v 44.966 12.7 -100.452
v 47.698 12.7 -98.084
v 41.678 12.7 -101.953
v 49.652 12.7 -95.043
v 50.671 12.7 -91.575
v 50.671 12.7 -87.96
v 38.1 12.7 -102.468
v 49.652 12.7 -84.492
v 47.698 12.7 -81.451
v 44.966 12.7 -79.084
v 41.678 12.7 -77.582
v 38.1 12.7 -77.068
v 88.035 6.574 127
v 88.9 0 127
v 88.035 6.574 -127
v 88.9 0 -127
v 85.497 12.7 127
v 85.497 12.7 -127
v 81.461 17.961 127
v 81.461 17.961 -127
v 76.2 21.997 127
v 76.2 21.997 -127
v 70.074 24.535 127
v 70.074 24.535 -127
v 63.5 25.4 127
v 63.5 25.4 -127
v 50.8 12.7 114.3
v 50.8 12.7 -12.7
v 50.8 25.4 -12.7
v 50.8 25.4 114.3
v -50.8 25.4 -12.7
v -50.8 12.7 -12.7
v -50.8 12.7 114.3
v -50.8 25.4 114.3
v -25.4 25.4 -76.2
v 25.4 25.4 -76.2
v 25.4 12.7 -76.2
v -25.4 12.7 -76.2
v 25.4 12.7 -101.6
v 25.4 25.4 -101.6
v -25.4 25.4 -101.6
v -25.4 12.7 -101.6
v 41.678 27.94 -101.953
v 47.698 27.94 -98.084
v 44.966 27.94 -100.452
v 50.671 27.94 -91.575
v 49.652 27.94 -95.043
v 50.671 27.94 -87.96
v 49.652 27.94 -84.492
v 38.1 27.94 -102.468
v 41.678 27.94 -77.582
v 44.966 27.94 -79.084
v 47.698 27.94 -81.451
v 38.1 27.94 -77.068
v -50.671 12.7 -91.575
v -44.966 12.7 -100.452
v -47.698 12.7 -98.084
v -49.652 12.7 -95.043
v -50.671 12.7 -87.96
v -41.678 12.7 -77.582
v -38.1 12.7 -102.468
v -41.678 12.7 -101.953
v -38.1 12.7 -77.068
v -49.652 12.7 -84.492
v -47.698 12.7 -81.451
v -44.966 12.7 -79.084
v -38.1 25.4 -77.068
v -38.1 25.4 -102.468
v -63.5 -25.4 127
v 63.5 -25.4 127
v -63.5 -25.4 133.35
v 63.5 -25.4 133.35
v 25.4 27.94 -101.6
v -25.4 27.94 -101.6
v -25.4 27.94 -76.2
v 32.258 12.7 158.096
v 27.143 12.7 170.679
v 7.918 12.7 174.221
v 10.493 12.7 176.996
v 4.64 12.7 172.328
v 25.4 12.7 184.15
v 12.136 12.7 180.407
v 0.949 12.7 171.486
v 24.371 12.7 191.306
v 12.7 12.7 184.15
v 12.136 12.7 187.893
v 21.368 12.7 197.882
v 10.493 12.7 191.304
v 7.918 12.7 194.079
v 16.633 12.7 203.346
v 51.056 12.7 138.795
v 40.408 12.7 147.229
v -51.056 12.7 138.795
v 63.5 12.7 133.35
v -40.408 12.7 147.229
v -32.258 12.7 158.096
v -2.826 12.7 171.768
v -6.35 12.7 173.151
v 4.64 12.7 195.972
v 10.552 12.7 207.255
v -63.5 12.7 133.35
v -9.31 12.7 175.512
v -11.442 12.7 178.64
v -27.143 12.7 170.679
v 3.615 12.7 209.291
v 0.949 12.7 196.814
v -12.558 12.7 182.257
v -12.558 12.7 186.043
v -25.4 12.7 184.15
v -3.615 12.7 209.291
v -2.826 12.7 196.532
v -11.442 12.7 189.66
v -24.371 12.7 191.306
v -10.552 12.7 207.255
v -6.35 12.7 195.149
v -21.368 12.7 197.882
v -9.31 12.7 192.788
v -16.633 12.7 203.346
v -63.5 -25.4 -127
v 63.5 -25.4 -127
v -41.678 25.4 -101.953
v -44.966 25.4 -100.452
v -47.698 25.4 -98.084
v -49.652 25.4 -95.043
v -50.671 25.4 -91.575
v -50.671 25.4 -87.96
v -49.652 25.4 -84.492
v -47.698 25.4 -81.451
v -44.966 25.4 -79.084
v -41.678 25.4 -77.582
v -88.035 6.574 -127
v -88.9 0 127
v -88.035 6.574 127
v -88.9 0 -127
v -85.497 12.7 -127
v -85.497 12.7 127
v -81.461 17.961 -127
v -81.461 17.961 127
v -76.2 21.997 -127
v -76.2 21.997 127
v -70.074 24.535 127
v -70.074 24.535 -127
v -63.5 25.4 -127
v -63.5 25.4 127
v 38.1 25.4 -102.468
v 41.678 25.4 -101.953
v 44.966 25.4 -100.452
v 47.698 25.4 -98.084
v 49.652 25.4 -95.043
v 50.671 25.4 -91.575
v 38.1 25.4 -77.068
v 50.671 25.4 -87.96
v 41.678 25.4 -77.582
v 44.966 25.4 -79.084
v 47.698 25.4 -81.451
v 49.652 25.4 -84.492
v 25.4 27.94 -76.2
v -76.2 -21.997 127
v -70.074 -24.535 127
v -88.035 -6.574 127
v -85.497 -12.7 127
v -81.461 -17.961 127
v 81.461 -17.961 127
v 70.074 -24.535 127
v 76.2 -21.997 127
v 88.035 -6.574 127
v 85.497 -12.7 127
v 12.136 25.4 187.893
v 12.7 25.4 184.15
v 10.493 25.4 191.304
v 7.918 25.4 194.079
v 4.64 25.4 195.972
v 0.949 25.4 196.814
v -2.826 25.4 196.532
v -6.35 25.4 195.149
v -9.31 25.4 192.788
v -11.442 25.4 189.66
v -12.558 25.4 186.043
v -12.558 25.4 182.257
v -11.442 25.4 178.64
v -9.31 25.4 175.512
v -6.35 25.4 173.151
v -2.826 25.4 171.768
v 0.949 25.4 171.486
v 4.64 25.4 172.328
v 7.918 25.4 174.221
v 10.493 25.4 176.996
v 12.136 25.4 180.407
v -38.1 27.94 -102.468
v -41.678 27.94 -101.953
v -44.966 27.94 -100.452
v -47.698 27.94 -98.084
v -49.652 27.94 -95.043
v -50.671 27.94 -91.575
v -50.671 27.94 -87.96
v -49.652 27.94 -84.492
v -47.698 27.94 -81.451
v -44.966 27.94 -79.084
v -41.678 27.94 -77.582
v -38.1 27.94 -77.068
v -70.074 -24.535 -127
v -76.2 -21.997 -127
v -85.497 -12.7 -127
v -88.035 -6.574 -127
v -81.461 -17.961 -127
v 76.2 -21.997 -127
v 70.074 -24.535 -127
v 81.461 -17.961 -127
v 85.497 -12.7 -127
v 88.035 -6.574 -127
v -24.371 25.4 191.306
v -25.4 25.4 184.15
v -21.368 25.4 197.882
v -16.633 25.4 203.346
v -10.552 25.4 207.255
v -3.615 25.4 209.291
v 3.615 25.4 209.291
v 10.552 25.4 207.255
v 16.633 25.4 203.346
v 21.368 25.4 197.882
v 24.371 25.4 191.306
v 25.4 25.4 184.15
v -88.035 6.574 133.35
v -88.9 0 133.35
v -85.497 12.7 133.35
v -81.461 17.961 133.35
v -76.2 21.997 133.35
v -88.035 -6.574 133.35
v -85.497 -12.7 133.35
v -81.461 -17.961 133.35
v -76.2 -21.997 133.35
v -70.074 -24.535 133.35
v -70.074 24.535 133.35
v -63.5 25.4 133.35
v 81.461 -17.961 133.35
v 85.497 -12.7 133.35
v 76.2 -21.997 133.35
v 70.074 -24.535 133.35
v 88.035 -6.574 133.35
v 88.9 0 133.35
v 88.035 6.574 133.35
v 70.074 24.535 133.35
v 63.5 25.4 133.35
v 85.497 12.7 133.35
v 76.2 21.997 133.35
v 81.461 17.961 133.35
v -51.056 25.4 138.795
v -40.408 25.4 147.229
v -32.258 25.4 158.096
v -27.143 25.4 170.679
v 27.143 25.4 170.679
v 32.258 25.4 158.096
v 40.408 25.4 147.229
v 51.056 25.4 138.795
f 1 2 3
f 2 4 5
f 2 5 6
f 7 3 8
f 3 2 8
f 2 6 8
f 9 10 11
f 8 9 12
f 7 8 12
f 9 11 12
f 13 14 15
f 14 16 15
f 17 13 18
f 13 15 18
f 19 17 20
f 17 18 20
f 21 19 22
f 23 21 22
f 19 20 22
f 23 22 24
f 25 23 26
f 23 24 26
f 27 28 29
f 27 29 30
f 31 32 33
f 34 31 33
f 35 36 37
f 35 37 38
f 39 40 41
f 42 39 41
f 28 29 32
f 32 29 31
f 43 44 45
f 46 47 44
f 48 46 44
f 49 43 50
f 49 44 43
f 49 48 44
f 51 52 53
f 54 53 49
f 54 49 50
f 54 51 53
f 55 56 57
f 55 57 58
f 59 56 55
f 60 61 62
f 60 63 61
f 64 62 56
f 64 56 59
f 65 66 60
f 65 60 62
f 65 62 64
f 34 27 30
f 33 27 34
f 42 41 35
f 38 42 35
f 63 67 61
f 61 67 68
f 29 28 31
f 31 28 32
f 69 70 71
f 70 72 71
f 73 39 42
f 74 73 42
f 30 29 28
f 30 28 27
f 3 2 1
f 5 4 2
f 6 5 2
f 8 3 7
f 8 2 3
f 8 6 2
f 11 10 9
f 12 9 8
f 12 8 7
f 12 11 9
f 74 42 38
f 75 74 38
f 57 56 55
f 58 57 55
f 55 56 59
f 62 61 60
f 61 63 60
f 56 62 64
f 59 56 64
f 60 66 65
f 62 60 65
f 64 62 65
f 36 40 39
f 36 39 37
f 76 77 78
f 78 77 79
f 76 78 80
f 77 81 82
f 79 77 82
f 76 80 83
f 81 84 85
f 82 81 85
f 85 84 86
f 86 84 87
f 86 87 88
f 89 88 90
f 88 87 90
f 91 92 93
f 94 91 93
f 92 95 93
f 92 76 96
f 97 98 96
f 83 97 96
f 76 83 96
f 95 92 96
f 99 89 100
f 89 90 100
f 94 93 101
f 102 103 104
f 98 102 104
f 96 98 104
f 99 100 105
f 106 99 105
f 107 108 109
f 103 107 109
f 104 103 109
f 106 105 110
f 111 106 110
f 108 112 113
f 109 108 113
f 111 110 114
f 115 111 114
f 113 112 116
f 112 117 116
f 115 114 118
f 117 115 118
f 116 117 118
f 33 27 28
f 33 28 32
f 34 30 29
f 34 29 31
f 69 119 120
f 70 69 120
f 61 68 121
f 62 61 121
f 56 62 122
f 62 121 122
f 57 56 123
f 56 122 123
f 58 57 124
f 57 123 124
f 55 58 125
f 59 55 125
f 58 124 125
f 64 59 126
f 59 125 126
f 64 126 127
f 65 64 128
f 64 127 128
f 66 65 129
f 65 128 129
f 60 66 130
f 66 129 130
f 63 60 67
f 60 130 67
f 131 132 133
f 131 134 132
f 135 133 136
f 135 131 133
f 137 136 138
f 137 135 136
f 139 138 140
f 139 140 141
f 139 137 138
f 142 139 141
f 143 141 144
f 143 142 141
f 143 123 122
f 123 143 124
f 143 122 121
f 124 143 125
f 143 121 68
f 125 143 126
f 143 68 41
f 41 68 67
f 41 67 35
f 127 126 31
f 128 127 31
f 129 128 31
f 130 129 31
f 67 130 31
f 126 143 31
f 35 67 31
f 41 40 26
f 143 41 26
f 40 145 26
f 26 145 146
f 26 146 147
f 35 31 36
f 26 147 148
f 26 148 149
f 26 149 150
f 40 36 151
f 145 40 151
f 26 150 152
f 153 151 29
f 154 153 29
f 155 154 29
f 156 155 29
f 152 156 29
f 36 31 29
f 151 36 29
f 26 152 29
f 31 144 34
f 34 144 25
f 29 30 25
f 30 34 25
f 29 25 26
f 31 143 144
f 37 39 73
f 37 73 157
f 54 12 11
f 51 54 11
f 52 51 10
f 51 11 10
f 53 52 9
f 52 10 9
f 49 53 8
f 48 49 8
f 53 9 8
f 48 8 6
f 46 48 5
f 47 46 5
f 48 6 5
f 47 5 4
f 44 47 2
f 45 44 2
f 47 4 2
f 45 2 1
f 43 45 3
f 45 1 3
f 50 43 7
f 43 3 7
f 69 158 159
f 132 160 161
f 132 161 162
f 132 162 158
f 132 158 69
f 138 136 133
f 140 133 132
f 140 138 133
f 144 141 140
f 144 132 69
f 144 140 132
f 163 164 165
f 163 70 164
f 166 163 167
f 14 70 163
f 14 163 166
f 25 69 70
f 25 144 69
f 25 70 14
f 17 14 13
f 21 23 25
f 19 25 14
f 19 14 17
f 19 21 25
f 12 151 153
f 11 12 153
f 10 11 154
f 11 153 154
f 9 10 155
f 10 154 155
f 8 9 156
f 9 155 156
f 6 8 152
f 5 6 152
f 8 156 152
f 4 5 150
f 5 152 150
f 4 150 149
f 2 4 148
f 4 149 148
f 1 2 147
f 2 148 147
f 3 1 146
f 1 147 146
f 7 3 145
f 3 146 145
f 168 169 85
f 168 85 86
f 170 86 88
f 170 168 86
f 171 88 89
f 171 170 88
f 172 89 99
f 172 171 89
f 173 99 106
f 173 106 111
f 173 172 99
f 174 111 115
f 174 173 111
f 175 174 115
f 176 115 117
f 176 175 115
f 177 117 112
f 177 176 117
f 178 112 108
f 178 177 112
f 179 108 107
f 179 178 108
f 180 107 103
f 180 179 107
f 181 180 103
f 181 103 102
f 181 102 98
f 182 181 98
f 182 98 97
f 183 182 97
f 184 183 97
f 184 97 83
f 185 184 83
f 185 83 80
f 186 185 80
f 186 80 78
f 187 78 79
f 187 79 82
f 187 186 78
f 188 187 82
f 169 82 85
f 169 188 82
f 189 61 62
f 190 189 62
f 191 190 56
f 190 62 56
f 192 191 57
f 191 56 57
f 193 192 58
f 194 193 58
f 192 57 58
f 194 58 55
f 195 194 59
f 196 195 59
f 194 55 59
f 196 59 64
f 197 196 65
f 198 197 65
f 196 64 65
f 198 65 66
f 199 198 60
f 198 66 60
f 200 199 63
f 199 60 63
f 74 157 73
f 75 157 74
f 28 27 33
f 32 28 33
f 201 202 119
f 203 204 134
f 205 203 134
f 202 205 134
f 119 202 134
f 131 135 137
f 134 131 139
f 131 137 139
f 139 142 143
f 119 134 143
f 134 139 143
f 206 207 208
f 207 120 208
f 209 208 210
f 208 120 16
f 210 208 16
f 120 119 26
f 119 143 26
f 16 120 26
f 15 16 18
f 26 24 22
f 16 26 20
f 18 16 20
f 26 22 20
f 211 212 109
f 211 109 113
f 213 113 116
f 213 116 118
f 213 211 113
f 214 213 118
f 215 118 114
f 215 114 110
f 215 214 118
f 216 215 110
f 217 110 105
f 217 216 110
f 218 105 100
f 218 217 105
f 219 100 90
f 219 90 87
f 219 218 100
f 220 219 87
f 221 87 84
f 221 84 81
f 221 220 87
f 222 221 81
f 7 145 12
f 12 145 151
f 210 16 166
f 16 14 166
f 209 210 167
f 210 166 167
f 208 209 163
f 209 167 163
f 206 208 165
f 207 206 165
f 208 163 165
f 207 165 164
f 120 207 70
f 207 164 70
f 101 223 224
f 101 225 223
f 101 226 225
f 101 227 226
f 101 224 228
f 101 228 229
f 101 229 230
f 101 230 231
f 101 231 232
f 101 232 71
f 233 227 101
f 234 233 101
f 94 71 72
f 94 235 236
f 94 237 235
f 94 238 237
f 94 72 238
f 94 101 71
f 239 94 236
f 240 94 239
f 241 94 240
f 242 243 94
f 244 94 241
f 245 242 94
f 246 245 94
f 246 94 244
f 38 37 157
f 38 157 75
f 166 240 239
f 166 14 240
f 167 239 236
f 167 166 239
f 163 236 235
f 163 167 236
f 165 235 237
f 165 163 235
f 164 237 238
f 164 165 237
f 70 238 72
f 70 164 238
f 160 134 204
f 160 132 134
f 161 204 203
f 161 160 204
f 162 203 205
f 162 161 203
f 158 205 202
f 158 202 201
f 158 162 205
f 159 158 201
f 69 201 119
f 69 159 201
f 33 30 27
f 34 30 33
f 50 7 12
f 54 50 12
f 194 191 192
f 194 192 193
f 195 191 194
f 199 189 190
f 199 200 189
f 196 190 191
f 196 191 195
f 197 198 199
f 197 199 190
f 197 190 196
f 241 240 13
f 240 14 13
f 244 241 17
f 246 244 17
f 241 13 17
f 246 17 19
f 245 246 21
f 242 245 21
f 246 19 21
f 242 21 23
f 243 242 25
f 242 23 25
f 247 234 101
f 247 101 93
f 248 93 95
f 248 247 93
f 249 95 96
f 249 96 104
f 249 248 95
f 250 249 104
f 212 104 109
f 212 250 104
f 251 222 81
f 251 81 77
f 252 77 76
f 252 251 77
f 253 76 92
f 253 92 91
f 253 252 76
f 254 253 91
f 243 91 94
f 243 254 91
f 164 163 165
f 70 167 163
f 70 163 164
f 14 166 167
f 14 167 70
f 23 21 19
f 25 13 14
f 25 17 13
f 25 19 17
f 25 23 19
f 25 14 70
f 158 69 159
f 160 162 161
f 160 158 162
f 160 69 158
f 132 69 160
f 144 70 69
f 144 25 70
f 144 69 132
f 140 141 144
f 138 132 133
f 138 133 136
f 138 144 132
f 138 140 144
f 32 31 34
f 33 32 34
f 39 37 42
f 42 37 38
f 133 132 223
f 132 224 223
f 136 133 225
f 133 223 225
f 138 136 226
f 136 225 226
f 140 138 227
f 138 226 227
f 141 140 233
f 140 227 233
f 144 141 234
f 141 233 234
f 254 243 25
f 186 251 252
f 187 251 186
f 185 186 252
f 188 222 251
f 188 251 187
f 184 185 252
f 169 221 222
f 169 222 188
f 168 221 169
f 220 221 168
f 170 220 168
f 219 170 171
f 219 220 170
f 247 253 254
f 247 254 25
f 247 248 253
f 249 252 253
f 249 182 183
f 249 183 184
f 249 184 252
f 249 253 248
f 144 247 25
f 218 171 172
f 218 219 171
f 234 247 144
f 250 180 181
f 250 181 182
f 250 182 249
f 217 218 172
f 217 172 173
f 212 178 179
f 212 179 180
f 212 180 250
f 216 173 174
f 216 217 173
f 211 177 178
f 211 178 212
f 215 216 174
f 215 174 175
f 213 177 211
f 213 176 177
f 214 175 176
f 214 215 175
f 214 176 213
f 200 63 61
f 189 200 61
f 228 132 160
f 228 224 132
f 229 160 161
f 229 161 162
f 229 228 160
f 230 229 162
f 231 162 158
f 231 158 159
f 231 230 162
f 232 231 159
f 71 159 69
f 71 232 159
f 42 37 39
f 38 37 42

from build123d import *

# Parameters (mm, degrees)
F0_W      = 177.8
F0_H      = 50.8
F1_DEPTH  = 127
F2_R      = 25.39999
F3_W      = 101.6
F3_H      = 127
F3_W_2    = 50.8
F3_H_2    = 25.4
F4_DEPTH  = 12.7
F5_DEPTH  = 15.24
F6_DEPTH  = 15.24
F7_DEPTH  = 15.24
F8_DEPTH  = 12.7
F10_DEPTH = 50.8
F11_DEPTH = 12.7
F12_R     = 25.39999


# Not quite as in the source:
# - a fillet or chamfer is up to 0.001 mm smaller than in the source, because OpenCascade refuses the exact size
# - ends of sketch curves that miss each other by under 0.0002 mm in the source are joined


with BuildPart() as f1:
    # F0 (on Top) → F1 (new body, symmetric)
    with BuildSketch(Plane.XY):
        Rectangle(F0_W, F0_H)
    extrude(amount=F1_DEPTH, both=True)

    # F2 (radius 25.4 in the source; OpenCascade refuses exactly that, so slightly less here)
    f2_edges = [f1.edges().sort_by_distance(p)[0] for p in [
        (-88.9, -25.4, 0),
        (-88.9, 25.4, 0),
        (88.9, -25.4, 0),
        (88.9, 25.4, 0),
    ]]
    fillet(f2_edges, radius=F2_R)

    # F3 (on face) → F4 (cut)
    with BuildSketch(Plane(origin=(0, 25.4, 0), x_dir=(-1, 0, 0), z_dir=(0, 1, 0))):
        with Locations((0, 50.8)):
            Rectangle(F3_W, F3_H)
        with Locations((0, -88.9)):
            Rectangle(F3_W_2, F3_H_2)
        with BuildLine():
            Line((-38.1, -102.4676784873), (-38.1, -77.0676784873))
            ThreePointArc((-38.1, -77.0676784873), (-50.8, -89.7676784873), (-38.1, -102.4676784873))
        make_face()
        with BuildLine():
            ThreePointArc((38.1, -102.4676784873), (50.8, -89.7676784873), (38.1, -77.0676784873))
            Line((38.1, -77.0676784873), (38.1, -102.4676784873))
        make_face()
    extrude(amount=-F4_DEPTH, mode=Mode.SUBTRACT)


with BuildPart() as f5:
    # F5 (new): a face of the model
    f5_faces = [f1.part.faces().sort_by_distance(p)[0] for p in [
        (43.490047406, 12.7, -89.7676784873),
    ]]
    extrude(f5_faces, amount=F5_DEPTH)


with BuildPart() as f6:
    # F6 (new): a face of the model
    f6_faces = [f1.part.faces().sort_by_distance(p)[0] for p in [
        (0, 12.7, -88.9),
    ]]
    extrude(f6_faces, amount=F6_DEPTH)


with BuildPart() as f7:
    # F7 (new): a face of the model
    f7_faces = [f1.part.faces().sort_by_distance(p)[0] for p in [
        (-43.490047406, 12.7, -89.7676784873),
    ]]
    extrude(f7_faces, amount=F7_DEPTH)


with BuildPart() as f8:
    # F8 (new): a face of the model
    f8_faces = [f1.part.faces().sort_by_distance(p)[0] for p in [
        (0, 12.7, 50.8),
    ]]
    extrude(f8_faces, amount=F8_DEPTH)


with BuildPart() as f10:
    # F9 (on face) → F10 (new body)
    with BuildSketch(Plane(origin=(0, 25.4, 0), x_dir=(-1, 0, 0), z_dir=(0, 1, 0))):
        Polygon((-88.9, 127), (-63.5000066667, 127), (63.5, 127), (88.9, 127), (88.9, 133.35), (63.5, 133.35), (25.4, 133.35), (-25.4, 133.35), (-63.5, 133.35), (-88.9, 133.35), align=None)
    extrude(amount=-F10_DEPTH)

    # F9 (on face) → F11 (join)
    with BuildSketch(Plane(origin=(0, 25.4, 0), x_dir=(-1, 0, 0), z_dir=(0, 1, 0))):
        with BuildLine():
            Line((-25.4, 184.15), (-25.4, 133.35))
            Line((-25.4, 133.35), (25.4, 133.35))
            Line((25.4, 133.35), (25.4, 184.15))
            Line((25.4, 184.15), (12.7, 184.15))
            ThreePointArc((12.7, 184.15), (0, 171.45), (-12.7, 184.15))
            Line((-12.7, 184.15), (-25.4, 184.15))
        make_face()
        with BuildLine():
            Line((25.4, 133.35), (63.5, 133.35))
            ThreePointArc((63.5, 133.35), (35.9833333333, 152.4), (25.4, 184.15))
            Line((25.4, 184.15), (25.4, 133.35))
        make_face()
        with BuildLine():
            ThreePointArc((-25.4, 184.15), (-35.9833333333, 152.4), (-63.5, 133.35))
            Line((-63.5, 133.35), (-25.4, 133.35))
            Line((-25.4, 133.35), (-25.4, 184.15))
        make_face()
        with BuildLine():
            ThreePointArc((25.4, 184.15), (0, 209.55), (-25.4, 184.15))
            Line((-25.4, 184.15), (-12.7, 184.15))
            ThreePointArc((-12.7, 184.15), (0, 196.85), (12.7, 184.15))
            Line((12.7, 184.15), (25.4, 184.15))
        make_face()
    extrude(amount=-F11_DEPTH)

    # F12 (radius 25.4 in the source; OpenCascade refuses exactly that, so slightly less here)
    f12_edges = [f10.edges().sort_by_distance(p)[0] for p in [
        (-88.9, -25.4, 130.175),
        (-88.9, 25.4, 130.175),
        (88.9, -25.4, 130.175),
        (88.9, 25.4, 130.175),
    ]]
    fillet(f12_edges, radius=F12_R)


solid = Compound([f1.part, f5.part, f6.part, f7.part, f8.part, f10.part])
